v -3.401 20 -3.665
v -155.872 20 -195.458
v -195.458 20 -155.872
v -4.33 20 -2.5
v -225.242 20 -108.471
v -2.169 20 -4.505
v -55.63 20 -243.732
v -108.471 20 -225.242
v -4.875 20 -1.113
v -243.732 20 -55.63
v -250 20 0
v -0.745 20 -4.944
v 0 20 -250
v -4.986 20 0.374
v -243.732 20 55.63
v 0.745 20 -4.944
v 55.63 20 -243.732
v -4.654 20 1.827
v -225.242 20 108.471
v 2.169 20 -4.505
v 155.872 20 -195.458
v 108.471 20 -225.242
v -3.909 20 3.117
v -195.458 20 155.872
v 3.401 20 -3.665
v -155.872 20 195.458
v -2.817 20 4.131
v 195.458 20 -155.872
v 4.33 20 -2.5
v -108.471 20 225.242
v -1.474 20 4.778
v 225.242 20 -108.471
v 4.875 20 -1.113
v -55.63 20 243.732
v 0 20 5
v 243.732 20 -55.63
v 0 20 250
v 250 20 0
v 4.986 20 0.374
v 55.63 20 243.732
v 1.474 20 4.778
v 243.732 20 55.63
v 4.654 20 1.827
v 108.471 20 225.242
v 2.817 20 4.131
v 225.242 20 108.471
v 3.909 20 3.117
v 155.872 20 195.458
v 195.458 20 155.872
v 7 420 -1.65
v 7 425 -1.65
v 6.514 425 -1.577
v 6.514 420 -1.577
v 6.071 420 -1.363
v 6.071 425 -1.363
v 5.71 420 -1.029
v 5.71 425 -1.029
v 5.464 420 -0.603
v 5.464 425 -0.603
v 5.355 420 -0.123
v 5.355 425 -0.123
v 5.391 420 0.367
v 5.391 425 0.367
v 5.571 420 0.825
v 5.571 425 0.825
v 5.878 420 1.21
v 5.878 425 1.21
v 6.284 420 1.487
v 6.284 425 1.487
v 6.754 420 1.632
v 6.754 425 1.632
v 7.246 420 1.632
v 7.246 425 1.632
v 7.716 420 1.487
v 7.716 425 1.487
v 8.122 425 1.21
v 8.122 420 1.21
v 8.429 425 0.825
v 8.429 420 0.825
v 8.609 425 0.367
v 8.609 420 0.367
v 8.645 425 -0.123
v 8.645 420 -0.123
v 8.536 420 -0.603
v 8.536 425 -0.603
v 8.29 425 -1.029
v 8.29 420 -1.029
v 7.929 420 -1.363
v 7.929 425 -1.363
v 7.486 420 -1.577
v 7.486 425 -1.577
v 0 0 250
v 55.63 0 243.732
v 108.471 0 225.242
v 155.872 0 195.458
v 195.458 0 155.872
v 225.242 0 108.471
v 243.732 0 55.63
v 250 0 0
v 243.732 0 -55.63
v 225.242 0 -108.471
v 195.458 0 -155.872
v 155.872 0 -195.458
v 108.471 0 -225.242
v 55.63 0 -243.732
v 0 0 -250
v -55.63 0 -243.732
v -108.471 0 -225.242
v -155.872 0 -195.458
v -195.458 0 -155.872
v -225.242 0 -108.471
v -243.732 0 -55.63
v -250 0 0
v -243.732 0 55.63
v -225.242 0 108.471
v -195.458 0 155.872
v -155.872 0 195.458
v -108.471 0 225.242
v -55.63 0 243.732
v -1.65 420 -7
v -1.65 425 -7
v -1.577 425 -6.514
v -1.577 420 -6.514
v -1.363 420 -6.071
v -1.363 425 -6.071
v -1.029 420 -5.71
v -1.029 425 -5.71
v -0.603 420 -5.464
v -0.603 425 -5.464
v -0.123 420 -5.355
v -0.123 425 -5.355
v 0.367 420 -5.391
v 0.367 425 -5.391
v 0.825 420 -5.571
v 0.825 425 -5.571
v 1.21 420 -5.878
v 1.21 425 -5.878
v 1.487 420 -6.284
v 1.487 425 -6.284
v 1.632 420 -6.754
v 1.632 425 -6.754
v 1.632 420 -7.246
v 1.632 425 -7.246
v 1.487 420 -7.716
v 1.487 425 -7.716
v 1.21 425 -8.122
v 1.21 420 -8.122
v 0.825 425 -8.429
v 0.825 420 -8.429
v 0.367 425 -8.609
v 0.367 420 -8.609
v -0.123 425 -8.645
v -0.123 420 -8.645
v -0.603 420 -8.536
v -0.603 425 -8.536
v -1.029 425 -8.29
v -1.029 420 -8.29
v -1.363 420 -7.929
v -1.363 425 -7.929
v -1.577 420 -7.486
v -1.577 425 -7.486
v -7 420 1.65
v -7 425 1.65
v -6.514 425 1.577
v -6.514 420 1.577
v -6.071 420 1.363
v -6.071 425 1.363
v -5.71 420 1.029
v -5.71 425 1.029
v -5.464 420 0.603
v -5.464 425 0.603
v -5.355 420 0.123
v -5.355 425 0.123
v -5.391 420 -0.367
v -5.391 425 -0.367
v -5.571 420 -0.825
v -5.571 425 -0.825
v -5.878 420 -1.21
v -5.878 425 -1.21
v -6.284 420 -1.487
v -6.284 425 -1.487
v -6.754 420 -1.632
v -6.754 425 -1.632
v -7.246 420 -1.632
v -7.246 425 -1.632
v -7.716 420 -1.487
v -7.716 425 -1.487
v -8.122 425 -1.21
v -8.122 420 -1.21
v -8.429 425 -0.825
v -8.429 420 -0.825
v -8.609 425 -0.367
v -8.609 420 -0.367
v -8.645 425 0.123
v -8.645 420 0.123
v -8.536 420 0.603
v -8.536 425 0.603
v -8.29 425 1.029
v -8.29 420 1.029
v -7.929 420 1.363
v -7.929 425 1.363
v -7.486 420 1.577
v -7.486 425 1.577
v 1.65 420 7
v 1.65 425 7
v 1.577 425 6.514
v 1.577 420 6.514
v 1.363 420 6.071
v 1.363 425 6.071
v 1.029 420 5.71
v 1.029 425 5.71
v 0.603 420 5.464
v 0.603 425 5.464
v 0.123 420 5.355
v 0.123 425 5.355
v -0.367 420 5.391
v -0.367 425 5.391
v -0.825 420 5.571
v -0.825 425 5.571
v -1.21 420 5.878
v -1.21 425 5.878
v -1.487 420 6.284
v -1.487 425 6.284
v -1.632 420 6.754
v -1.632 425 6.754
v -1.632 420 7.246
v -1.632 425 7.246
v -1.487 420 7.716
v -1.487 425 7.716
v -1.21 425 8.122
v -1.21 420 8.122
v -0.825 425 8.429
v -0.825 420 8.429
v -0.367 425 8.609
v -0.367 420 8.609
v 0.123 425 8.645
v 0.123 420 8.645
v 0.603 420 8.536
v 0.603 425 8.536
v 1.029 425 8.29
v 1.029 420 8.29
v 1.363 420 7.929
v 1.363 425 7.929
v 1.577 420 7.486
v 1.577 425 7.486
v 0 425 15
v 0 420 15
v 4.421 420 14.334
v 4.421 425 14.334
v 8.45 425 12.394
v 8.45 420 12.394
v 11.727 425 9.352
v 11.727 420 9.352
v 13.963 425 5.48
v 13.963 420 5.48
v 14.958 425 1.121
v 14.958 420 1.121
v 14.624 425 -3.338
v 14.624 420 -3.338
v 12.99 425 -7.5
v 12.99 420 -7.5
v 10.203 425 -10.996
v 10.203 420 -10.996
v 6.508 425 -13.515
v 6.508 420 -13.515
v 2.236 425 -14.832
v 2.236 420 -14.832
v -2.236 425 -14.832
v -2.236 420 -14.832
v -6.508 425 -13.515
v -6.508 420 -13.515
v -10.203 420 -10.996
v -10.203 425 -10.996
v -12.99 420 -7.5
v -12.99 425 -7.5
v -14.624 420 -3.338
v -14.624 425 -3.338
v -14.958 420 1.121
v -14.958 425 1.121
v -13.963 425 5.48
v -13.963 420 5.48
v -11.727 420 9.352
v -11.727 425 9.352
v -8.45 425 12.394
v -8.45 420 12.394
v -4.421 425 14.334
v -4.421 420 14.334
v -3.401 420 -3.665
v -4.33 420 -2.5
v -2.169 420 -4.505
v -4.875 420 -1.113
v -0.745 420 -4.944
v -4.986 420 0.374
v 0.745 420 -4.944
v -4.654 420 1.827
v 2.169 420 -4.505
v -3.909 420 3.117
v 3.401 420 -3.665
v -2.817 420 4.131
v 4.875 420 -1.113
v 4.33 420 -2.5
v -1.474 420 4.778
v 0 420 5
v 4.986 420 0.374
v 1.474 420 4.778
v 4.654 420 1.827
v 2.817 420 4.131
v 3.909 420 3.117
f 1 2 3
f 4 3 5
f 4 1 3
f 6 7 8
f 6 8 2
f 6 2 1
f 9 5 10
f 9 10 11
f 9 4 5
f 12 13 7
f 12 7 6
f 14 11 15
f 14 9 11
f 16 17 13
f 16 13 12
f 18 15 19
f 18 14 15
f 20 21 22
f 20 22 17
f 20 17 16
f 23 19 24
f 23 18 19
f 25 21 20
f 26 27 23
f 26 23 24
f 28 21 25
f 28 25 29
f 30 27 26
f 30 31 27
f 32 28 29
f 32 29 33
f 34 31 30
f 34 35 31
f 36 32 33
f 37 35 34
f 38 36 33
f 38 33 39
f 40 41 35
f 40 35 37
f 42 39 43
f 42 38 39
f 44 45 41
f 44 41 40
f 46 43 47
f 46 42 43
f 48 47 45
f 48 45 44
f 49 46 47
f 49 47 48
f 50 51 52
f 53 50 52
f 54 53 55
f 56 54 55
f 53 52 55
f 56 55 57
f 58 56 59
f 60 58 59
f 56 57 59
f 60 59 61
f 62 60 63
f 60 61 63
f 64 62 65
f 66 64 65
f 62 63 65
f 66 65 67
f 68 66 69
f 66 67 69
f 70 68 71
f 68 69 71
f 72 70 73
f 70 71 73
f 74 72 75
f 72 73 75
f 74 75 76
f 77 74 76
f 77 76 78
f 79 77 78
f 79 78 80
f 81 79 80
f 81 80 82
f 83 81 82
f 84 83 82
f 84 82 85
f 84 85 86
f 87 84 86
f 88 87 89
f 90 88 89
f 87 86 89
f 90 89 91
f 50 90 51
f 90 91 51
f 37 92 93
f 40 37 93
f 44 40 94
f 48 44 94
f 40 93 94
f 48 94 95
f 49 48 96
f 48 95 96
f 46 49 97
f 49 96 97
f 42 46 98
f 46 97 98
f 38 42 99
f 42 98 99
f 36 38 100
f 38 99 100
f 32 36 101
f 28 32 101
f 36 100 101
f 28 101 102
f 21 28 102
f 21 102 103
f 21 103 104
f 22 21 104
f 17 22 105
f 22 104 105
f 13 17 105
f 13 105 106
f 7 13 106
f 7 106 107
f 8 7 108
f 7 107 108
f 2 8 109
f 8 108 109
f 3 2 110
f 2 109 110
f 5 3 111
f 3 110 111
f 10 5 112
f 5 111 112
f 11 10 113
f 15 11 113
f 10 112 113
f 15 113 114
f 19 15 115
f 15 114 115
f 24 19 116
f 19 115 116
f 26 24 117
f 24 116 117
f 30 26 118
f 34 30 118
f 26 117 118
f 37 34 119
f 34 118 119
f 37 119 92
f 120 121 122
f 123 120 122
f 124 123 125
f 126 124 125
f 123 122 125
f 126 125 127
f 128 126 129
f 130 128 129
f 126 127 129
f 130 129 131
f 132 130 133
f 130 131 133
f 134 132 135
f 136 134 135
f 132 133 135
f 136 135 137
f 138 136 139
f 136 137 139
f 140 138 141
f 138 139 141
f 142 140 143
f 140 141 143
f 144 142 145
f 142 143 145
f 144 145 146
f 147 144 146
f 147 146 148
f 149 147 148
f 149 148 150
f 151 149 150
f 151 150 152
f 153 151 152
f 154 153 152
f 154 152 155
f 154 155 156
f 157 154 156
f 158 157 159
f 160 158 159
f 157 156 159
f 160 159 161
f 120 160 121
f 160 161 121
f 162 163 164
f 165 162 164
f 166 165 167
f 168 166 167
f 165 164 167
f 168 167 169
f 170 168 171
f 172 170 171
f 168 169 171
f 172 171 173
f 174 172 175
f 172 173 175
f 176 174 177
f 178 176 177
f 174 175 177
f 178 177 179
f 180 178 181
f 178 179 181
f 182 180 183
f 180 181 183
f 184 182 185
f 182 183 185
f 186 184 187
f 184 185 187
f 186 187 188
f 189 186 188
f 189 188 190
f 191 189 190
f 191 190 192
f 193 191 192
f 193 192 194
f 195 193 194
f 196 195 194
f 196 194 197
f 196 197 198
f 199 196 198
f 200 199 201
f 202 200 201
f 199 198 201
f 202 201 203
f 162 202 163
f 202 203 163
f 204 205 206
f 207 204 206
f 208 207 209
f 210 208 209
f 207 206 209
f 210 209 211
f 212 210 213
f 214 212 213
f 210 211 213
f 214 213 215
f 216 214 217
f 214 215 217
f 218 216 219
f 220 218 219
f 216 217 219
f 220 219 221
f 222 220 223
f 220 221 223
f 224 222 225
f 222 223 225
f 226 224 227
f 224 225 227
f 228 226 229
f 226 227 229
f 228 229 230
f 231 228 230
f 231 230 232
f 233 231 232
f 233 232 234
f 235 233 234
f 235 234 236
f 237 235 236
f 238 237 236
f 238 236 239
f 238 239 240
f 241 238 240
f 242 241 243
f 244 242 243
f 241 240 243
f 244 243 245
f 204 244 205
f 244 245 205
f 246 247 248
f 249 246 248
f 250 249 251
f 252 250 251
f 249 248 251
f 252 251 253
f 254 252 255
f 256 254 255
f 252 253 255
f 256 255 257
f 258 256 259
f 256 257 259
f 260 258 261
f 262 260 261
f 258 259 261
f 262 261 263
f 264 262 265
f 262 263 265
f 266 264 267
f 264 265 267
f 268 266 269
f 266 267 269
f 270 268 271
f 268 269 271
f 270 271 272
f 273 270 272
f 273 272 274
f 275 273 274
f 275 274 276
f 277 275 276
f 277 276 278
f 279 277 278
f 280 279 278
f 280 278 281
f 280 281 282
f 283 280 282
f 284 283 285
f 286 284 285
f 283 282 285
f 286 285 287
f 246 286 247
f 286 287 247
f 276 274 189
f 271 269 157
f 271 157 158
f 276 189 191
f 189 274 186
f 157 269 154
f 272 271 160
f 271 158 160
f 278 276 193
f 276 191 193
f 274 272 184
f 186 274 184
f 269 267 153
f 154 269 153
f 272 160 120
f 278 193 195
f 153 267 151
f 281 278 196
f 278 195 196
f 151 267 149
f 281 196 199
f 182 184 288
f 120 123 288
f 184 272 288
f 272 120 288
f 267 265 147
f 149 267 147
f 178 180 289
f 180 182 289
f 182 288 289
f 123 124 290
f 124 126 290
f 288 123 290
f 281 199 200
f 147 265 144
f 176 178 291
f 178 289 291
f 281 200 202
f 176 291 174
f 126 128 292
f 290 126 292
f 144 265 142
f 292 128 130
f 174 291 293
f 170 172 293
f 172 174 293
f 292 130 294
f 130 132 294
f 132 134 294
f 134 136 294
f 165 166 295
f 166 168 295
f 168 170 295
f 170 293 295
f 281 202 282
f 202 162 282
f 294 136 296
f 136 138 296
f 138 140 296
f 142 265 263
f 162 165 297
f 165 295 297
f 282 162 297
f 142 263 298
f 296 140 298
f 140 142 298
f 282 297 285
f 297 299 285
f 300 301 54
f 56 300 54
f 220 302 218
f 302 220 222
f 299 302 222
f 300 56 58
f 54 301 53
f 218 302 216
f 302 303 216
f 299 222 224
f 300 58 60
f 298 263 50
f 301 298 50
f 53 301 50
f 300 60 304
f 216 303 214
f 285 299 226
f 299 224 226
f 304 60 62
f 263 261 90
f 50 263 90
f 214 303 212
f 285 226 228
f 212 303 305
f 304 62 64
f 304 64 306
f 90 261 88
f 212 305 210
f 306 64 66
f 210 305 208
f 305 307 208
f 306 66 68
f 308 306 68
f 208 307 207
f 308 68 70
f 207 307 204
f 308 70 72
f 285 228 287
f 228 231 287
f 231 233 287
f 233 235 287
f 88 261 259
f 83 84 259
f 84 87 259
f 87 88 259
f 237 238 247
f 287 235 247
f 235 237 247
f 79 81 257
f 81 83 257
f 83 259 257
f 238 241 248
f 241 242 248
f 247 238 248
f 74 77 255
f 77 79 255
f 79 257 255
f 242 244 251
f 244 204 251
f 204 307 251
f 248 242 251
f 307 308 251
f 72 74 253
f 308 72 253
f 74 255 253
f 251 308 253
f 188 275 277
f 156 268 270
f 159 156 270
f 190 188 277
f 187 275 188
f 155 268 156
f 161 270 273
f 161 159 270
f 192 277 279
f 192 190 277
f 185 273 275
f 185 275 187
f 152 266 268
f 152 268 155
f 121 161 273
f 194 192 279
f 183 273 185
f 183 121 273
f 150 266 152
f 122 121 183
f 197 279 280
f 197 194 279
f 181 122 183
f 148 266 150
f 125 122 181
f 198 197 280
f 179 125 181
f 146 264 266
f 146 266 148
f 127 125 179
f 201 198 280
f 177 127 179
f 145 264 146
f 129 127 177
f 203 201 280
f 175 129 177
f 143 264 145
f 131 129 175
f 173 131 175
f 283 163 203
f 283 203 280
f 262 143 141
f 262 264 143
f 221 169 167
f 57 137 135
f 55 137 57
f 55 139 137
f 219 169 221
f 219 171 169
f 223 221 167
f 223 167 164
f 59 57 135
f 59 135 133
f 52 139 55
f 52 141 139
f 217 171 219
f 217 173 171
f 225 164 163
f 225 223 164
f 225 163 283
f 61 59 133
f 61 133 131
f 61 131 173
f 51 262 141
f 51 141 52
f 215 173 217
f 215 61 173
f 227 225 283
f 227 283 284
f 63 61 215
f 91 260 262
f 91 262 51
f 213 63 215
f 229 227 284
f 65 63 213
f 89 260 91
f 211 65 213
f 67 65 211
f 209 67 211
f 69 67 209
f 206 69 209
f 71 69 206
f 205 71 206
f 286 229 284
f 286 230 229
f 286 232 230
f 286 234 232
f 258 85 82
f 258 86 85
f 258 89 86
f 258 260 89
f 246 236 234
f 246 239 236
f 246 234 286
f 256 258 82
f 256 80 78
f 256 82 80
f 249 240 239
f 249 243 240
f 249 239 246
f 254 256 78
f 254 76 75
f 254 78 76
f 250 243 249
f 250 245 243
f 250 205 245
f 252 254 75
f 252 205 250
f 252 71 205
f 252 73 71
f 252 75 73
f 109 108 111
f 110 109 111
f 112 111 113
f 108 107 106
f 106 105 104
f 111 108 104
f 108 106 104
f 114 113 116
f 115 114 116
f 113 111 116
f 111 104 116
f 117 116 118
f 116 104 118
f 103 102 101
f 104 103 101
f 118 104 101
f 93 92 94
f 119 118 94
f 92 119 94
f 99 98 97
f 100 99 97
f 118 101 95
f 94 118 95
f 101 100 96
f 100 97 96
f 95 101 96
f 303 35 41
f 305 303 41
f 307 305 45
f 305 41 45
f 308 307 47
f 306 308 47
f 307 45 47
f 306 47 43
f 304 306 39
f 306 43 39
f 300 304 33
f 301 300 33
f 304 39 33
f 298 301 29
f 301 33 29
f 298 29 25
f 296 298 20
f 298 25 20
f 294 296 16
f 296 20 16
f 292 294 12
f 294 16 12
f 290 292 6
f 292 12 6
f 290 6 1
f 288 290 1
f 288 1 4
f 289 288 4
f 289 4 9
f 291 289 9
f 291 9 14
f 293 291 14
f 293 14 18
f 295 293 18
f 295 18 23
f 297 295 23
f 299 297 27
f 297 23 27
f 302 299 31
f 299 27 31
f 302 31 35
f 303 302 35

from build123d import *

# Parameters (mm, degrees)
SKETCH_1_R               = 250
EXTRUDE_1_DEPTH          = 20
SKETCH_2_R               = 5
EXTRUDE_2_DEPTH          = 400
SKETCH_3_R               = 15
EXTRUDE_3_DEPTH          = 5
SKETCH_4_R               = 1.65
CUT_EXTRUDE_1_DEPTH      = 5
PATTERN_CIRCULAR_1_COUNT = 4


with BuildPart() as part:
    # 草图1 → 凸台-拉伸1 (new body)
    with BuildSketch(Plane(origin=(0, 0, 0), x_dir=(1, 0, 0), z_dir=(0, 1, 0))):
        with Locations(Location((0, 0, 0), (0, 0, 270))):
            Circle(SKETCH_1_R)
    extrude(amount=EXTRUDE_1_DEPTH)

    # 草图2 → 凸台-拉伸2 (add)
    with BuildSketch(Plane(origin=(0, 20, 0), x_dir=(1, 0, 0), z_dir=(0, 1, 0))):
        with Locations(Location((0, 0, 0), (0, 0, 270))):
            Circle(SKETCH_2_R)
    extrude(amount=EXTRUDE_2_DEPTH)

    # 草图3 → 凸台-拉伸3 (add)
    with BuildSketch(Plane(origin=(0, 420, 0), x_dir=(1, 0, 0), z_dir=(0, 1, 0))):
        with Locations(Location((0, 0, 0), (0, 0, 270))):
            Circle(SKETCH_3_R)
    extrude(amount=EXTRUDE_3_DEPTH)

    # 草图4 → 切除-拉伸1 (cut)
    with BuildSketch(Plane(origin=(0, 425, 0), x_dir=(1, 0, 0), z_dir=(0, 1, 0))):
        with Locations(Location((-7, 0, 0), (0, 0, 270))):
            Circle(SKETCH_4_R)
    cut_extrude_1 = extrude(amount=-CUT_EXTRUDE_1_DEPTH, mode=Mode.SUBTRACT)

    # 阵列(圆周)1: 切除-拉伸1 ×4 about axis
    pattern_circular_1_axis = Axis((0, 0, 0), (0, 1, 0))
    for i in range(1, PATTERN_CIRCULAR_1_COUNT):
        add(cut_extrude_1.rotate(pattern_circular_1_axis, i * 360 / PATTERN_CIRCULAR_1_COUNT), mode=Mode.SUBTRACT)


solid = part.part
